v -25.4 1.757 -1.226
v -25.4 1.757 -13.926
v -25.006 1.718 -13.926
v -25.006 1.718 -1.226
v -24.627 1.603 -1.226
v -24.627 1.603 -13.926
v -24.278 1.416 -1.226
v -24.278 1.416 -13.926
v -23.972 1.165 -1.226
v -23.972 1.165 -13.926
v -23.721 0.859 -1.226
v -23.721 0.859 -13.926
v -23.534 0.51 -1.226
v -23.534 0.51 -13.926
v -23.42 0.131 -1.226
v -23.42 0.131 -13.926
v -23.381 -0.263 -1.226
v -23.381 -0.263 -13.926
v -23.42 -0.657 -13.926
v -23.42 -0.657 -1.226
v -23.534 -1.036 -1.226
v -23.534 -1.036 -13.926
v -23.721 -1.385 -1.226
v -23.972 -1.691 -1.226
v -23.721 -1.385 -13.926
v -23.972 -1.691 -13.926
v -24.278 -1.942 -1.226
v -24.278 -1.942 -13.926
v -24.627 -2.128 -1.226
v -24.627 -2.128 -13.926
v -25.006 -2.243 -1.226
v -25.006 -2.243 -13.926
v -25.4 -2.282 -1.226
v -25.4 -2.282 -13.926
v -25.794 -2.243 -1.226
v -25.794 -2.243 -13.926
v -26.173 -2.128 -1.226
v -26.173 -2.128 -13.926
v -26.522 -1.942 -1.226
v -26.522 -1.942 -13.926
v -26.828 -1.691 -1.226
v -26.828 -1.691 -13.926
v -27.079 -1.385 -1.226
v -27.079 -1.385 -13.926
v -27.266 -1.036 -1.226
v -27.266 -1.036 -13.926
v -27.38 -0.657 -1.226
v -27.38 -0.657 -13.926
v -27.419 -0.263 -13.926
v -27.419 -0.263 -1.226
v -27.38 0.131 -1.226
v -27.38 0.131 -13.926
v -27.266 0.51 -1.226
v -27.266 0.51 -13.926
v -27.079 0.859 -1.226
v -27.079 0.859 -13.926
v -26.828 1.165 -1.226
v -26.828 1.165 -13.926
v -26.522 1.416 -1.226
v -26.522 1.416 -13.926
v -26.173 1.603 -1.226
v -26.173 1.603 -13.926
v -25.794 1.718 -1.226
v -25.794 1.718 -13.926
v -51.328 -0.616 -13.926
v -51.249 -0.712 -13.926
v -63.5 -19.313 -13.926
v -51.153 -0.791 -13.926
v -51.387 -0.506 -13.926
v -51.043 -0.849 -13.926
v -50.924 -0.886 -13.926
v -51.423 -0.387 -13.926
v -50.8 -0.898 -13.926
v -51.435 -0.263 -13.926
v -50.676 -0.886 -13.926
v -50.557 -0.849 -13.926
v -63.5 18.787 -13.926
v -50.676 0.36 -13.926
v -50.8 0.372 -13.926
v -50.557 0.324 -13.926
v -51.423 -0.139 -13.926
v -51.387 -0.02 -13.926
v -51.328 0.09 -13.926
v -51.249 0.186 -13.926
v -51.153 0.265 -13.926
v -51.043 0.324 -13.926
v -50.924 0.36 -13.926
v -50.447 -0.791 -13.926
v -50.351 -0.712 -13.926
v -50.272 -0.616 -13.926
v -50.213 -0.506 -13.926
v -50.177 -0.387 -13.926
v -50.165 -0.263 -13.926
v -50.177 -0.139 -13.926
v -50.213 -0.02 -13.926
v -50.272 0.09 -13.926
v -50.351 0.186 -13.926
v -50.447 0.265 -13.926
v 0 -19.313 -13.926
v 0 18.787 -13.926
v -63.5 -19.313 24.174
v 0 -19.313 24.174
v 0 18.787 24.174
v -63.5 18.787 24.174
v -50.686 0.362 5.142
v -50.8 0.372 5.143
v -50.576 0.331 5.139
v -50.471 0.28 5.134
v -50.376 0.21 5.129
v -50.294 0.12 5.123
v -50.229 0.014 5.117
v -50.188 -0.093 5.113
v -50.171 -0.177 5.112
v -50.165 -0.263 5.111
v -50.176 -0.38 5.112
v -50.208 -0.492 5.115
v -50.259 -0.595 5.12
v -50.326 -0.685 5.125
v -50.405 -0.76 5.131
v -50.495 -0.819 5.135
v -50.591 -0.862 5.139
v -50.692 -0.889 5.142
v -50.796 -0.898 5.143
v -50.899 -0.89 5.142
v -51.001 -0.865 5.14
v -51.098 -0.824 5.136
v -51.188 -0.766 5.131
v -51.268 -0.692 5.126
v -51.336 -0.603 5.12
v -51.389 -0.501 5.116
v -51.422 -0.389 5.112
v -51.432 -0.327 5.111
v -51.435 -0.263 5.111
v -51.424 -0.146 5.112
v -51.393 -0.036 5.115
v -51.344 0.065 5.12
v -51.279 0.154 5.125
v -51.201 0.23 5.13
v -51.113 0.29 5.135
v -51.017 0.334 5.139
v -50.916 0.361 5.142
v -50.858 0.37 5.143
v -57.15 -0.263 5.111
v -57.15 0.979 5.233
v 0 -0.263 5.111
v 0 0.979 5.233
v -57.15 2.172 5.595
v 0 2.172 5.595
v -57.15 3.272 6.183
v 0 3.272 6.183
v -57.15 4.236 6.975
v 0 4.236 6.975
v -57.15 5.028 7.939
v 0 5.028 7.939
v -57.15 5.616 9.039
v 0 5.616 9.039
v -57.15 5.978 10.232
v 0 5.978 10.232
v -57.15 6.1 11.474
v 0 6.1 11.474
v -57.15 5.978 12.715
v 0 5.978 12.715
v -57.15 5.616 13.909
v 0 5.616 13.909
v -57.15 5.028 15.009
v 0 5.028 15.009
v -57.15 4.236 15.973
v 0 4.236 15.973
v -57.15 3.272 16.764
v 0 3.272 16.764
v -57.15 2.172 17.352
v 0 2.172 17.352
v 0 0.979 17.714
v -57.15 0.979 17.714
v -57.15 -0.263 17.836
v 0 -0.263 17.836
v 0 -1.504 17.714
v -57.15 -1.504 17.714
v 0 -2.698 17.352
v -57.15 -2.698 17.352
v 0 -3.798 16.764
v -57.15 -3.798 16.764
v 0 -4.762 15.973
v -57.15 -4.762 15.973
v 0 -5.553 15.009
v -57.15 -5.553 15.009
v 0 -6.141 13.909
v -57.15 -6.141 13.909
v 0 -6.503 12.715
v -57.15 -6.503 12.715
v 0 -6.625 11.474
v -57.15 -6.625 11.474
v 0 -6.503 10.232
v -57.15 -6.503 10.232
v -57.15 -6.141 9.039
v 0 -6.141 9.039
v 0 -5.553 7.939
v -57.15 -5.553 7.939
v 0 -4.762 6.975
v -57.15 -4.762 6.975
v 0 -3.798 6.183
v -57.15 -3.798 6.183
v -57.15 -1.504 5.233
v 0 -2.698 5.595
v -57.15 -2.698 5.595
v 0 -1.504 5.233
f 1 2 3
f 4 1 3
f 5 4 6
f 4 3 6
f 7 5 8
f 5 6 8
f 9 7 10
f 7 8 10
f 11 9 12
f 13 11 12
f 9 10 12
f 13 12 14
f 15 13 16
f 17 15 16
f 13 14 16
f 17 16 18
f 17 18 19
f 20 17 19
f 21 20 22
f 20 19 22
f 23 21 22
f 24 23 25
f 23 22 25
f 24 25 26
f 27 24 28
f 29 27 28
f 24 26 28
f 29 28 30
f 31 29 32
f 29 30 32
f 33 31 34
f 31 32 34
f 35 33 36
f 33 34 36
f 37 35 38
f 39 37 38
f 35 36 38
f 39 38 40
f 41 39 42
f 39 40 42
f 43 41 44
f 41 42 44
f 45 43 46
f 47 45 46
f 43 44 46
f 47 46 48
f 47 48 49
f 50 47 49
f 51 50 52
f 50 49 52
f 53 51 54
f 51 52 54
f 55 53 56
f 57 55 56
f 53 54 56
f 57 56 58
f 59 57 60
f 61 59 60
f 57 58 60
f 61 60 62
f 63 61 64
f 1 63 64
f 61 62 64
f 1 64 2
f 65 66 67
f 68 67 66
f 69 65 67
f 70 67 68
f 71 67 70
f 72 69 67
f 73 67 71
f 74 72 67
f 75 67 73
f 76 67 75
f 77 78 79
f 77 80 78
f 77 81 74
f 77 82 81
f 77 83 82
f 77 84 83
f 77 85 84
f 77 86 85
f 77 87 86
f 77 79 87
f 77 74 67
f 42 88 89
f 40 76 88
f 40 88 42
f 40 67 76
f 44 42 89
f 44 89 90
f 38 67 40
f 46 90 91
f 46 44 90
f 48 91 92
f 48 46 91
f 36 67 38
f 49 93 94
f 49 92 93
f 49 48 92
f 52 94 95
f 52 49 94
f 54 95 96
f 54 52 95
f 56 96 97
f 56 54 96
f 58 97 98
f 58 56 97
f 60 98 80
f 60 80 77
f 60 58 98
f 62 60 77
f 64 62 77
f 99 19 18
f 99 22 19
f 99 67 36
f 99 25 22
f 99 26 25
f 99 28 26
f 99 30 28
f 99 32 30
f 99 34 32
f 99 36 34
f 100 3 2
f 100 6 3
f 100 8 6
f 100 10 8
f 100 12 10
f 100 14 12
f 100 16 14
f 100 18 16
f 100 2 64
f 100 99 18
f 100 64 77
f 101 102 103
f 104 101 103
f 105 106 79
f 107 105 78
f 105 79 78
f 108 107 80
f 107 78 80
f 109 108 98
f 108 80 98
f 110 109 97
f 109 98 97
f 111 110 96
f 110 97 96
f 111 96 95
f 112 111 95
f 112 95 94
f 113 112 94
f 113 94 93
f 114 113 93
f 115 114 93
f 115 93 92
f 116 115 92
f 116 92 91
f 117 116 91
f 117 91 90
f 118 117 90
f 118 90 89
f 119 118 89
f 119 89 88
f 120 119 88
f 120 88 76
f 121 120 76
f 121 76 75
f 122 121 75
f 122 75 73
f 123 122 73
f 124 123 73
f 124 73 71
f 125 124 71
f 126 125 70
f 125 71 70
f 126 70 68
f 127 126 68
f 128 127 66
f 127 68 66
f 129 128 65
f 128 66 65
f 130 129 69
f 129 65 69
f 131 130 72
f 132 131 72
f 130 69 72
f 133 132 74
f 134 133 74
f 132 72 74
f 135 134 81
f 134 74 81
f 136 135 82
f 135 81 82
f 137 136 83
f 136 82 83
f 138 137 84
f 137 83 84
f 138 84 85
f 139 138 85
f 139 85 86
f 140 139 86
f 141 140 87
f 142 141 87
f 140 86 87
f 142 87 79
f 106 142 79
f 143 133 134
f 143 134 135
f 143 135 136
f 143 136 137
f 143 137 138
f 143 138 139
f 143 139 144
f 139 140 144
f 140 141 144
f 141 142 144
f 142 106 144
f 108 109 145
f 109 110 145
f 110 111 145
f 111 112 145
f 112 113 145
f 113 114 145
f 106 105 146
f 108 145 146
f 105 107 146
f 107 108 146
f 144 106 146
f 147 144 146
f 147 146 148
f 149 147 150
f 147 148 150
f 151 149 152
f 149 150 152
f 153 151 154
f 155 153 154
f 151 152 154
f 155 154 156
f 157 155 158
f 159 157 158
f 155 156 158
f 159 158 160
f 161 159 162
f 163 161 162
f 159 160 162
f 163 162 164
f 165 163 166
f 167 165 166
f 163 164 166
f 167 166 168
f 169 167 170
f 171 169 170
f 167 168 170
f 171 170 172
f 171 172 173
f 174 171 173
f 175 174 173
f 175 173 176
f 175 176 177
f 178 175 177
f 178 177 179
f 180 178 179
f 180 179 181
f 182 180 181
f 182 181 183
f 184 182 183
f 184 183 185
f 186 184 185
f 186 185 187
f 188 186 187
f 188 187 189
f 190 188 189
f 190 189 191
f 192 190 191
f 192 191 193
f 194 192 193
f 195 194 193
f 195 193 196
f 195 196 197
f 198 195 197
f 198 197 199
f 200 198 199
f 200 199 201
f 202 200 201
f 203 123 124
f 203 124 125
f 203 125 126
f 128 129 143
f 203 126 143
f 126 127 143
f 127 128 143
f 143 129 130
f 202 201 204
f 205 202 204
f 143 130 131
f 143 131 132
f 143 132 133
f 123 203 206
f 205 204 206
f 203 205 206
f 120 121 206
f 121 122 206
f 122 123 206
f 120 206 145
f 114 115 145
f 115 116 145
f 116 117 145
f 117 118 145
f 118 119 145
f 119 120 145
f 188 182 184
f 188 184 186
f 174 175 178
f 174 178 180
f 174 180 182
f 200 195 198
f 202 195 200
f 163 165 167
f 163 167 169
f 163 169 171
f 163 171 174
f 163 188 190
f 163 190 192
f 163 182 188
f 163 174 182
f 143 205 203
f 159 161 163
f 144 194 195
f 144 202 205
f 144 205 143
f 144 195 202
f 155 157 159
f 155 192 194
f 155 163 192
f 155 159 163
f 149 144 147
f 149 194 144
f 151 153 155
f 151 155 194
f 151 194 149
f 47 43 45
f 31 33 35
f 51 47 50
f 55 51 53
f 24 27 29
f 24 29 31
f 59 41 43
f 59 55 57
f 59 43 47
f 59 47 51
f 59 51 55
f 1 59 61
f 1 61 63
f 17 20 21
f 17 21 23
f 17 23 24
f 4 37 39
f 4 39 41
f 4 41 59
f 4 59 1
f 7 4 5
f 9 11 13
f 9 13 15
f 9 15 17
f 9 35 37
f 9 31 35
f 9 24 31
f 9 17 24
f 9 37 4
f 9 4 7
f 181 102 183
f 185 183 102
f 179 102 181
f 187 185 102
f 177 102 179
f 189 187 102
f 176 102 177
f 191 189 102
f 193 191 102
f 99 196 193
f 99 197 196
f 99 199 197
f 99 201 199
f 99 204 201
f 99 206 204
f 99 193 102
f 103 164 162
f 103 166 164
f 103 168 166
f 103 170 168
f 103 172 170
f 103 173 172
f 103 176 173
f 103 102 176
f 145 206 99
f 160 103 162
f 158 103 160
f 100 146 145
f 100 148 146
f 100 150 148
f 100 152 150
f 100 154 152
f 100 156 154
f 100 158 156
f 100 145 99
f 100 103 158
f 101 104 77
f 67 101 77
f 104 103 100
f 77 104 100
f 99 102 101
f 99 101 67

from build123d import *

# Parameters (mm, degrees)
SKETCH1_W           = 38.1
SKETCH1_H           = 38.1
BOSS_EXTRUDE1_DEPTH = 63.5
SKETCH2_R           = 6.3627
CUT_EXTRUDE1_DEPTH  = 57.15
SKETCH6_R           = 2.0193
CUT_EXTRUDE4_DEPTH  = 12.7
SKETCH7_R           = 0.635
CUT_EXTRUDE5_DEPTH  = 22.86


with BuildPart() as part:
    # Sketch1 → Boss-Extrude1 (new body)
    with BuildSketch(Plane(origin=(0, 0, 0), x_dir=(0, 0, -1), z_dir=(1, 0, 0))):
        with Locations((-5.123793103, -0.262758621)):
            Rectangle(SKETCH1_W, SKETCH1_H)
    extrude(amount=-BOSS_EXTRUDE1_DEPTH)

    # Sketch2 → Cut-Extrude1 (cut)
    with BuildSketch(Plane(origin=(0, 0, 0), x_dir=(0, 0, -1), z_dir=(1, 0, 0))):
        with Locations((-11.473793103, -0.262758621)):
            Circle(SKETCH2_R)
    extrude(amount=-CUT_EXTRUDE1_DEPTH, mode=Mode.SUBTRACT)

    # Sketch6 → Cut-Extrude4 (cut)
    with BuildSketch(Plane(origin=(0, 0, -13.926206897), x_dir=(-1, 0, 0), z_dir=(0, 0, -1))):
        with Locations(Location((25.4, -0.262758621, 0), (0, 0, 90))):
            Circle(SKETCH6_R)
    extrude(amount=-CUT_EXTRUDE4_DEPTH, mode=Mode.SUBTRACT)

    # Sketch7 → Cut-Extrude5 (cut)
    with BuildSketch(Plane(origin=(0, 0, -13.926206897), x_dir=(-1, 0, 0), z_dir=(0, 0, -1))):
        with Locations(Location((50.8, -0.262758621, 0), (0, 0, 90))):
            Circle(SKETCH7_R)
    extrude(amount=-CUT_EXTRUDE5_DEPTH, mode=Mode.SUBTRACT)


solid = part.part
